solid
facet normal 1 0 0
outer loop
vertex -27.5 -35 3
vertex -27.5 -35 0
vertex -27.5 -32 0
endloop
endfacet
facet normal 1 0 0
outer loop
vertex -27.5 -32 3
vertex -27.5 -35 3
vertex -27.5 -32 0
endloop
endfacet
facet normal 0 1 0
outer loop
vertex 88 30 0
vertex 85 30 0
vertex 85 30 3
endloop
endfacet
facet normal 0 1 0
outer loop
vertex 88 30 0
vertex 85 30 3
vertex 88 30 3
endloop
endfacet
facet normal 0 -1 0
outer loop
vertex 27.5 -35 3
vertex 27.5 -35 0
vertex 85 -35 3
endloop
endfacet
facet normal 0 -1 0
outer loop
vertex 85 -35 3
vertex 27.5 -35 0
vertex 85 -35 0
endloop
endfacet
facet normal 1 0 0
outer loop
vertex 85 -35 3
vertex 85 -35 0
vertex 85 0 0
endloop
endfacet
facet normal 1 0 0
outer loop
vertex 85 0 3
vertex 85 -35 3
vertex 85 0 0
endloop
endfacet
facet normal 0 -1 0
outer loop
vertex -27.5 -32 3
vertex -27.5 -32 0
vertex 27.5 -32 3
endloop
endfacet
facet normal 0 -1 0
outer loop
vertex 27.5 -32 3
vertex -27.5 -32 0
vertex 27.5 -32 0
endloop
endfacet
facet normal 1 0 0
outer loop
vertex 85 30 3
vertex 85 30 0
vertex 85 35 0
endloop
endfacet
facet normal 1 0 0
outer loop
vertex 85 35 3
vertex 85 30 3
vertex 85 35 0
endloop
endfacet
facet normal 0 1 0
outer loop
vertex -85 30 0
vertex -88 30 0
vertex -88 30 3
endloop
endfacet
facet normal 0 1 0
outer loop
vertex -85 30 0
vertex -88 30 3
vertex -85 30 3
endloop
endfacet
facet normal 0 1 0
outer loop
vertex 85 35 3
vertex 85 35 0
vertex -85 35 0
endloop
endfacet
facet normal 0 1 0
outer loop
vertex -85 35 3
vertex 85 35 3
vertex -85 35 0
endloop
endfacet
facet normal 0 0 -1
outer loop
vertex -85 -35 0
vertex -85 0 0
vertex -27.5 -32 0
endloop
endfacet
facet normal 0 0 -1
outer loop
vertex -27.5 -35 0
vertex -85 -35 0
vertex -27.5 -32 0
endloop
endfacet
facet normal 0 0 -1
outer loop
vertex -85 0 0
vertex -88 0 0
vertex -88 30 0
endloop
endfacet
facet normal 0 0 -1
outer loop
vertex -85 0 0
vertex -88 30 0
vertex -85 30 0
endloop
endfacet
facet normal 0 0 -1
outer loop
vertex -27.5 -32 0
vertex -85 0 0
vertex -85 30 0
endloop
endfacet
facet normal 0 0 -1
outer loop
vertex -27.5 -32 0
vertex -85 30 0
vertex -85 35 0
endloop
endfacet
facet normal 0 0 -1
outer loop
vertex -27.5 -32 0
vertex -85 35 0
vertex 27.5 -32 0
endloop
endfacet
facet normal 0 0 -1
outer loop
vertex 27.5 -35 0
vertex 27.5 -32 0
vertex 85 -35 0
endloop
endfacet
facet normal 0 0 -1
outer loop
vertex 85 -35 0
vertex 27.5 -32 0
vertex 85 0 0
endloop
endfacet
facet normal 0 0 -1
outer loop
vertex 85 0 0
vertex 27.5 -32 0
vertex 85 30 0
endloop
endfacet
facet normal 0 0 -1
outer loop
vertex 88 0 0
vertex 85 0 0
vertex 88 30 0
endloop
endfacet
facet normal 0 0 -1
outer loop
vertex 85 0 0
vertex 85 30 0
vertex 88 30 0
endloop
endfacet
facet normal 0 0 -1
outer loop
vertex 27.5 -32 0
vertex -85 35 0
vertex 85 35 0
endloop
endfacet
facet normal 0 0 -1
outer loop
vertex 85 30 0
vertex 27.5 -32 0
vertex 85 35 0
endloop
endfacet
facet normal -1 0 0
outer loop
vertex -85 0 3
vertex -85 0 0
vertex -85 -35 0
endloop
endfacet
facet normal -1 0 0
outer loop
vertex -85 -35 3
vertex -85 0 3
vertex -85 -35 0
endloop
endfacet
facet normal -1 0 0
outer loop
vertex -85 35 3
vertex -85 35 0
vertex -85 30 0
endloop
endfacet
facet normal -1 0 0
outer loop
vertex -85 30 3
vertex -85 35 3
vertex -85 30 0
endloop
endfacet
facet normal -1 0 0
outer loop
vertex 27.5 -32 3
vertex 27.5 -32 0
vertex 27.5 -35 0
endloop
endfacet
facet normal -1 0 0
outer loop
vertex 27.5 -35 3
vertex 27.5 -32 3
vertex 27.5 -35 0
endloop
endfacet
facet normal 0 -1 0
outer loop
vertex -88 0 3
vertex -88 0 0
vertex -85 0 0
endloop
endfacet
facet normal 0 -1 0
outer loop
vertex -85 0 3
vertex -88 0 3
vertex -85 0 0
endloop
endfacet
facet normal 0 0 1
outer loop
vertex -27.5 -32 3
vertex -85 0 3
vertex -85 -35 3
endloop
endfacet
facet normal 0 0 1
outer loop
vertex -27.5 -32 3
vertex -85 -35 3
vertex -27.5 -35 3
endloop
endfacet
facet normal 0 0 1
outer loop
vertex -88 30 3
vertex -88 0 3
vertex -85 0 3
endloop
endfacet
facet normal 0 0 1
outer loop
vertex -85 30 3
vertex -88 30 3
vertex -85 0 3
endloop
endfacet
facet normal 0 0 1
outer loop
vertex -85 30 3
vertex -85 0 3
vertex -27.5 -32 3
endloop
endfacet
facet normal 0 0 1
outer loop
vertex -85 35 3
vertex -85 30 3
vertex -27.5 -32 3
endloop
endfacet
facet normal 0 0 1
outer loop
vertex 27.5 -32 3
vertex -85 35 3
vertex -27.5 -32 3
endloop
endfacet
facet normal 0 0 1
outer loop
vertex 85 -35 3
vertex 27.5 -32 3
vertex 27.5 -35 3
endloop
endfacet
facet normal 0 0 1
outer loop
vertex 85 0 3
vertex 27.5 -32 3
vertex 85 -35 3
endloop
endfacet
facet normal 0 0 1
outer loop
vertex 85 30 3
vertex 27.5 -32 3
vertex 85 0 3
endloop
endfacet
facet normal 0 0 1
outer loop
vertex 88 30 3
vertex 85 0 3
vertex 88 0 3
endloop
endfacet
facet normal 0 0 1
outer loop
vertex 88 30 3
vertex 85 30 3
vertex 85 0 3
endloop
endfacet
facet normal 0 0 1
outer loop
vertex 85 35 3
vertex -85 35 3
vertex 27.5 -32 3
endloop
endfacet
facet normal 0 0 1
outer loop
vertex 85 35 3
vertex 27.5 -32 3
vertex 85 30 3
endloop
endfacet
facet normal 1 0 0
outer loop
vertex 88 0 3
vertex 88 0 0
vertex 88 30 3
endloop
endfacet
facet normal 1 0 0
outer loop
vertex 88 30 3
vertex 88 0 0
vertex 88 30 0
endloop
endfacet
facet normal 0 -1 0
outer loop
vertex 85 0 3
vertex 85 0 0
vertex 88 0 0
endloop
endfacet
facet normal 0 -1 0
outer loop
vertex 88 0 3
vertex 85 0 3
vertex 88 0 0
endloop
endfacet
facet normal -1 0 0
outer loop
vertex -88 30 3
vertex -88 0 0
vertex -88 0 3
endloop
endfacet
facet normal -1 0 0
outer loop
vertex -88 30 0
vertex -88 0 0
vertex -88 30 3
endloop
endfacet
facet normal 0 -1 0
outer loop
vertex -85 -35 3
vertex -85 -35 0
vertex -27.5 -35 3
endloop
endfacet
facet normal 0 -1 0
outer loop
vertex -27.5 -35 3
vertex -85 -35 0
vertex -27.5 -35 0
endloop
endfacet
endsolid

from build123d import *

# Parameters (mm, degrees)
F0_W     = 3
F0_H     = 30
F1_DEPTH = 3


with BuildPart() as f1:
    # F0 (on Top) → F1 (new body)
    with BuildSketch(Plane.XY):
        with Locations((86.5, 15)):
            Rectangle(F0_W, F0_H)
        with Locations((-86.5, 15)):
            Rectangle(F0_W, F0_H)
        Polygon((85, 30), (85, 35), (-85, 35), (-85, 30), (-85, 0), (-85, -35), (-27.5, -35), (-27.5, -32), (27.5, -32), (27.5, -35), (85, -35), (85, 0), align=None)
    extrude(amount=F1_DEPTH)


solid = f1.part
